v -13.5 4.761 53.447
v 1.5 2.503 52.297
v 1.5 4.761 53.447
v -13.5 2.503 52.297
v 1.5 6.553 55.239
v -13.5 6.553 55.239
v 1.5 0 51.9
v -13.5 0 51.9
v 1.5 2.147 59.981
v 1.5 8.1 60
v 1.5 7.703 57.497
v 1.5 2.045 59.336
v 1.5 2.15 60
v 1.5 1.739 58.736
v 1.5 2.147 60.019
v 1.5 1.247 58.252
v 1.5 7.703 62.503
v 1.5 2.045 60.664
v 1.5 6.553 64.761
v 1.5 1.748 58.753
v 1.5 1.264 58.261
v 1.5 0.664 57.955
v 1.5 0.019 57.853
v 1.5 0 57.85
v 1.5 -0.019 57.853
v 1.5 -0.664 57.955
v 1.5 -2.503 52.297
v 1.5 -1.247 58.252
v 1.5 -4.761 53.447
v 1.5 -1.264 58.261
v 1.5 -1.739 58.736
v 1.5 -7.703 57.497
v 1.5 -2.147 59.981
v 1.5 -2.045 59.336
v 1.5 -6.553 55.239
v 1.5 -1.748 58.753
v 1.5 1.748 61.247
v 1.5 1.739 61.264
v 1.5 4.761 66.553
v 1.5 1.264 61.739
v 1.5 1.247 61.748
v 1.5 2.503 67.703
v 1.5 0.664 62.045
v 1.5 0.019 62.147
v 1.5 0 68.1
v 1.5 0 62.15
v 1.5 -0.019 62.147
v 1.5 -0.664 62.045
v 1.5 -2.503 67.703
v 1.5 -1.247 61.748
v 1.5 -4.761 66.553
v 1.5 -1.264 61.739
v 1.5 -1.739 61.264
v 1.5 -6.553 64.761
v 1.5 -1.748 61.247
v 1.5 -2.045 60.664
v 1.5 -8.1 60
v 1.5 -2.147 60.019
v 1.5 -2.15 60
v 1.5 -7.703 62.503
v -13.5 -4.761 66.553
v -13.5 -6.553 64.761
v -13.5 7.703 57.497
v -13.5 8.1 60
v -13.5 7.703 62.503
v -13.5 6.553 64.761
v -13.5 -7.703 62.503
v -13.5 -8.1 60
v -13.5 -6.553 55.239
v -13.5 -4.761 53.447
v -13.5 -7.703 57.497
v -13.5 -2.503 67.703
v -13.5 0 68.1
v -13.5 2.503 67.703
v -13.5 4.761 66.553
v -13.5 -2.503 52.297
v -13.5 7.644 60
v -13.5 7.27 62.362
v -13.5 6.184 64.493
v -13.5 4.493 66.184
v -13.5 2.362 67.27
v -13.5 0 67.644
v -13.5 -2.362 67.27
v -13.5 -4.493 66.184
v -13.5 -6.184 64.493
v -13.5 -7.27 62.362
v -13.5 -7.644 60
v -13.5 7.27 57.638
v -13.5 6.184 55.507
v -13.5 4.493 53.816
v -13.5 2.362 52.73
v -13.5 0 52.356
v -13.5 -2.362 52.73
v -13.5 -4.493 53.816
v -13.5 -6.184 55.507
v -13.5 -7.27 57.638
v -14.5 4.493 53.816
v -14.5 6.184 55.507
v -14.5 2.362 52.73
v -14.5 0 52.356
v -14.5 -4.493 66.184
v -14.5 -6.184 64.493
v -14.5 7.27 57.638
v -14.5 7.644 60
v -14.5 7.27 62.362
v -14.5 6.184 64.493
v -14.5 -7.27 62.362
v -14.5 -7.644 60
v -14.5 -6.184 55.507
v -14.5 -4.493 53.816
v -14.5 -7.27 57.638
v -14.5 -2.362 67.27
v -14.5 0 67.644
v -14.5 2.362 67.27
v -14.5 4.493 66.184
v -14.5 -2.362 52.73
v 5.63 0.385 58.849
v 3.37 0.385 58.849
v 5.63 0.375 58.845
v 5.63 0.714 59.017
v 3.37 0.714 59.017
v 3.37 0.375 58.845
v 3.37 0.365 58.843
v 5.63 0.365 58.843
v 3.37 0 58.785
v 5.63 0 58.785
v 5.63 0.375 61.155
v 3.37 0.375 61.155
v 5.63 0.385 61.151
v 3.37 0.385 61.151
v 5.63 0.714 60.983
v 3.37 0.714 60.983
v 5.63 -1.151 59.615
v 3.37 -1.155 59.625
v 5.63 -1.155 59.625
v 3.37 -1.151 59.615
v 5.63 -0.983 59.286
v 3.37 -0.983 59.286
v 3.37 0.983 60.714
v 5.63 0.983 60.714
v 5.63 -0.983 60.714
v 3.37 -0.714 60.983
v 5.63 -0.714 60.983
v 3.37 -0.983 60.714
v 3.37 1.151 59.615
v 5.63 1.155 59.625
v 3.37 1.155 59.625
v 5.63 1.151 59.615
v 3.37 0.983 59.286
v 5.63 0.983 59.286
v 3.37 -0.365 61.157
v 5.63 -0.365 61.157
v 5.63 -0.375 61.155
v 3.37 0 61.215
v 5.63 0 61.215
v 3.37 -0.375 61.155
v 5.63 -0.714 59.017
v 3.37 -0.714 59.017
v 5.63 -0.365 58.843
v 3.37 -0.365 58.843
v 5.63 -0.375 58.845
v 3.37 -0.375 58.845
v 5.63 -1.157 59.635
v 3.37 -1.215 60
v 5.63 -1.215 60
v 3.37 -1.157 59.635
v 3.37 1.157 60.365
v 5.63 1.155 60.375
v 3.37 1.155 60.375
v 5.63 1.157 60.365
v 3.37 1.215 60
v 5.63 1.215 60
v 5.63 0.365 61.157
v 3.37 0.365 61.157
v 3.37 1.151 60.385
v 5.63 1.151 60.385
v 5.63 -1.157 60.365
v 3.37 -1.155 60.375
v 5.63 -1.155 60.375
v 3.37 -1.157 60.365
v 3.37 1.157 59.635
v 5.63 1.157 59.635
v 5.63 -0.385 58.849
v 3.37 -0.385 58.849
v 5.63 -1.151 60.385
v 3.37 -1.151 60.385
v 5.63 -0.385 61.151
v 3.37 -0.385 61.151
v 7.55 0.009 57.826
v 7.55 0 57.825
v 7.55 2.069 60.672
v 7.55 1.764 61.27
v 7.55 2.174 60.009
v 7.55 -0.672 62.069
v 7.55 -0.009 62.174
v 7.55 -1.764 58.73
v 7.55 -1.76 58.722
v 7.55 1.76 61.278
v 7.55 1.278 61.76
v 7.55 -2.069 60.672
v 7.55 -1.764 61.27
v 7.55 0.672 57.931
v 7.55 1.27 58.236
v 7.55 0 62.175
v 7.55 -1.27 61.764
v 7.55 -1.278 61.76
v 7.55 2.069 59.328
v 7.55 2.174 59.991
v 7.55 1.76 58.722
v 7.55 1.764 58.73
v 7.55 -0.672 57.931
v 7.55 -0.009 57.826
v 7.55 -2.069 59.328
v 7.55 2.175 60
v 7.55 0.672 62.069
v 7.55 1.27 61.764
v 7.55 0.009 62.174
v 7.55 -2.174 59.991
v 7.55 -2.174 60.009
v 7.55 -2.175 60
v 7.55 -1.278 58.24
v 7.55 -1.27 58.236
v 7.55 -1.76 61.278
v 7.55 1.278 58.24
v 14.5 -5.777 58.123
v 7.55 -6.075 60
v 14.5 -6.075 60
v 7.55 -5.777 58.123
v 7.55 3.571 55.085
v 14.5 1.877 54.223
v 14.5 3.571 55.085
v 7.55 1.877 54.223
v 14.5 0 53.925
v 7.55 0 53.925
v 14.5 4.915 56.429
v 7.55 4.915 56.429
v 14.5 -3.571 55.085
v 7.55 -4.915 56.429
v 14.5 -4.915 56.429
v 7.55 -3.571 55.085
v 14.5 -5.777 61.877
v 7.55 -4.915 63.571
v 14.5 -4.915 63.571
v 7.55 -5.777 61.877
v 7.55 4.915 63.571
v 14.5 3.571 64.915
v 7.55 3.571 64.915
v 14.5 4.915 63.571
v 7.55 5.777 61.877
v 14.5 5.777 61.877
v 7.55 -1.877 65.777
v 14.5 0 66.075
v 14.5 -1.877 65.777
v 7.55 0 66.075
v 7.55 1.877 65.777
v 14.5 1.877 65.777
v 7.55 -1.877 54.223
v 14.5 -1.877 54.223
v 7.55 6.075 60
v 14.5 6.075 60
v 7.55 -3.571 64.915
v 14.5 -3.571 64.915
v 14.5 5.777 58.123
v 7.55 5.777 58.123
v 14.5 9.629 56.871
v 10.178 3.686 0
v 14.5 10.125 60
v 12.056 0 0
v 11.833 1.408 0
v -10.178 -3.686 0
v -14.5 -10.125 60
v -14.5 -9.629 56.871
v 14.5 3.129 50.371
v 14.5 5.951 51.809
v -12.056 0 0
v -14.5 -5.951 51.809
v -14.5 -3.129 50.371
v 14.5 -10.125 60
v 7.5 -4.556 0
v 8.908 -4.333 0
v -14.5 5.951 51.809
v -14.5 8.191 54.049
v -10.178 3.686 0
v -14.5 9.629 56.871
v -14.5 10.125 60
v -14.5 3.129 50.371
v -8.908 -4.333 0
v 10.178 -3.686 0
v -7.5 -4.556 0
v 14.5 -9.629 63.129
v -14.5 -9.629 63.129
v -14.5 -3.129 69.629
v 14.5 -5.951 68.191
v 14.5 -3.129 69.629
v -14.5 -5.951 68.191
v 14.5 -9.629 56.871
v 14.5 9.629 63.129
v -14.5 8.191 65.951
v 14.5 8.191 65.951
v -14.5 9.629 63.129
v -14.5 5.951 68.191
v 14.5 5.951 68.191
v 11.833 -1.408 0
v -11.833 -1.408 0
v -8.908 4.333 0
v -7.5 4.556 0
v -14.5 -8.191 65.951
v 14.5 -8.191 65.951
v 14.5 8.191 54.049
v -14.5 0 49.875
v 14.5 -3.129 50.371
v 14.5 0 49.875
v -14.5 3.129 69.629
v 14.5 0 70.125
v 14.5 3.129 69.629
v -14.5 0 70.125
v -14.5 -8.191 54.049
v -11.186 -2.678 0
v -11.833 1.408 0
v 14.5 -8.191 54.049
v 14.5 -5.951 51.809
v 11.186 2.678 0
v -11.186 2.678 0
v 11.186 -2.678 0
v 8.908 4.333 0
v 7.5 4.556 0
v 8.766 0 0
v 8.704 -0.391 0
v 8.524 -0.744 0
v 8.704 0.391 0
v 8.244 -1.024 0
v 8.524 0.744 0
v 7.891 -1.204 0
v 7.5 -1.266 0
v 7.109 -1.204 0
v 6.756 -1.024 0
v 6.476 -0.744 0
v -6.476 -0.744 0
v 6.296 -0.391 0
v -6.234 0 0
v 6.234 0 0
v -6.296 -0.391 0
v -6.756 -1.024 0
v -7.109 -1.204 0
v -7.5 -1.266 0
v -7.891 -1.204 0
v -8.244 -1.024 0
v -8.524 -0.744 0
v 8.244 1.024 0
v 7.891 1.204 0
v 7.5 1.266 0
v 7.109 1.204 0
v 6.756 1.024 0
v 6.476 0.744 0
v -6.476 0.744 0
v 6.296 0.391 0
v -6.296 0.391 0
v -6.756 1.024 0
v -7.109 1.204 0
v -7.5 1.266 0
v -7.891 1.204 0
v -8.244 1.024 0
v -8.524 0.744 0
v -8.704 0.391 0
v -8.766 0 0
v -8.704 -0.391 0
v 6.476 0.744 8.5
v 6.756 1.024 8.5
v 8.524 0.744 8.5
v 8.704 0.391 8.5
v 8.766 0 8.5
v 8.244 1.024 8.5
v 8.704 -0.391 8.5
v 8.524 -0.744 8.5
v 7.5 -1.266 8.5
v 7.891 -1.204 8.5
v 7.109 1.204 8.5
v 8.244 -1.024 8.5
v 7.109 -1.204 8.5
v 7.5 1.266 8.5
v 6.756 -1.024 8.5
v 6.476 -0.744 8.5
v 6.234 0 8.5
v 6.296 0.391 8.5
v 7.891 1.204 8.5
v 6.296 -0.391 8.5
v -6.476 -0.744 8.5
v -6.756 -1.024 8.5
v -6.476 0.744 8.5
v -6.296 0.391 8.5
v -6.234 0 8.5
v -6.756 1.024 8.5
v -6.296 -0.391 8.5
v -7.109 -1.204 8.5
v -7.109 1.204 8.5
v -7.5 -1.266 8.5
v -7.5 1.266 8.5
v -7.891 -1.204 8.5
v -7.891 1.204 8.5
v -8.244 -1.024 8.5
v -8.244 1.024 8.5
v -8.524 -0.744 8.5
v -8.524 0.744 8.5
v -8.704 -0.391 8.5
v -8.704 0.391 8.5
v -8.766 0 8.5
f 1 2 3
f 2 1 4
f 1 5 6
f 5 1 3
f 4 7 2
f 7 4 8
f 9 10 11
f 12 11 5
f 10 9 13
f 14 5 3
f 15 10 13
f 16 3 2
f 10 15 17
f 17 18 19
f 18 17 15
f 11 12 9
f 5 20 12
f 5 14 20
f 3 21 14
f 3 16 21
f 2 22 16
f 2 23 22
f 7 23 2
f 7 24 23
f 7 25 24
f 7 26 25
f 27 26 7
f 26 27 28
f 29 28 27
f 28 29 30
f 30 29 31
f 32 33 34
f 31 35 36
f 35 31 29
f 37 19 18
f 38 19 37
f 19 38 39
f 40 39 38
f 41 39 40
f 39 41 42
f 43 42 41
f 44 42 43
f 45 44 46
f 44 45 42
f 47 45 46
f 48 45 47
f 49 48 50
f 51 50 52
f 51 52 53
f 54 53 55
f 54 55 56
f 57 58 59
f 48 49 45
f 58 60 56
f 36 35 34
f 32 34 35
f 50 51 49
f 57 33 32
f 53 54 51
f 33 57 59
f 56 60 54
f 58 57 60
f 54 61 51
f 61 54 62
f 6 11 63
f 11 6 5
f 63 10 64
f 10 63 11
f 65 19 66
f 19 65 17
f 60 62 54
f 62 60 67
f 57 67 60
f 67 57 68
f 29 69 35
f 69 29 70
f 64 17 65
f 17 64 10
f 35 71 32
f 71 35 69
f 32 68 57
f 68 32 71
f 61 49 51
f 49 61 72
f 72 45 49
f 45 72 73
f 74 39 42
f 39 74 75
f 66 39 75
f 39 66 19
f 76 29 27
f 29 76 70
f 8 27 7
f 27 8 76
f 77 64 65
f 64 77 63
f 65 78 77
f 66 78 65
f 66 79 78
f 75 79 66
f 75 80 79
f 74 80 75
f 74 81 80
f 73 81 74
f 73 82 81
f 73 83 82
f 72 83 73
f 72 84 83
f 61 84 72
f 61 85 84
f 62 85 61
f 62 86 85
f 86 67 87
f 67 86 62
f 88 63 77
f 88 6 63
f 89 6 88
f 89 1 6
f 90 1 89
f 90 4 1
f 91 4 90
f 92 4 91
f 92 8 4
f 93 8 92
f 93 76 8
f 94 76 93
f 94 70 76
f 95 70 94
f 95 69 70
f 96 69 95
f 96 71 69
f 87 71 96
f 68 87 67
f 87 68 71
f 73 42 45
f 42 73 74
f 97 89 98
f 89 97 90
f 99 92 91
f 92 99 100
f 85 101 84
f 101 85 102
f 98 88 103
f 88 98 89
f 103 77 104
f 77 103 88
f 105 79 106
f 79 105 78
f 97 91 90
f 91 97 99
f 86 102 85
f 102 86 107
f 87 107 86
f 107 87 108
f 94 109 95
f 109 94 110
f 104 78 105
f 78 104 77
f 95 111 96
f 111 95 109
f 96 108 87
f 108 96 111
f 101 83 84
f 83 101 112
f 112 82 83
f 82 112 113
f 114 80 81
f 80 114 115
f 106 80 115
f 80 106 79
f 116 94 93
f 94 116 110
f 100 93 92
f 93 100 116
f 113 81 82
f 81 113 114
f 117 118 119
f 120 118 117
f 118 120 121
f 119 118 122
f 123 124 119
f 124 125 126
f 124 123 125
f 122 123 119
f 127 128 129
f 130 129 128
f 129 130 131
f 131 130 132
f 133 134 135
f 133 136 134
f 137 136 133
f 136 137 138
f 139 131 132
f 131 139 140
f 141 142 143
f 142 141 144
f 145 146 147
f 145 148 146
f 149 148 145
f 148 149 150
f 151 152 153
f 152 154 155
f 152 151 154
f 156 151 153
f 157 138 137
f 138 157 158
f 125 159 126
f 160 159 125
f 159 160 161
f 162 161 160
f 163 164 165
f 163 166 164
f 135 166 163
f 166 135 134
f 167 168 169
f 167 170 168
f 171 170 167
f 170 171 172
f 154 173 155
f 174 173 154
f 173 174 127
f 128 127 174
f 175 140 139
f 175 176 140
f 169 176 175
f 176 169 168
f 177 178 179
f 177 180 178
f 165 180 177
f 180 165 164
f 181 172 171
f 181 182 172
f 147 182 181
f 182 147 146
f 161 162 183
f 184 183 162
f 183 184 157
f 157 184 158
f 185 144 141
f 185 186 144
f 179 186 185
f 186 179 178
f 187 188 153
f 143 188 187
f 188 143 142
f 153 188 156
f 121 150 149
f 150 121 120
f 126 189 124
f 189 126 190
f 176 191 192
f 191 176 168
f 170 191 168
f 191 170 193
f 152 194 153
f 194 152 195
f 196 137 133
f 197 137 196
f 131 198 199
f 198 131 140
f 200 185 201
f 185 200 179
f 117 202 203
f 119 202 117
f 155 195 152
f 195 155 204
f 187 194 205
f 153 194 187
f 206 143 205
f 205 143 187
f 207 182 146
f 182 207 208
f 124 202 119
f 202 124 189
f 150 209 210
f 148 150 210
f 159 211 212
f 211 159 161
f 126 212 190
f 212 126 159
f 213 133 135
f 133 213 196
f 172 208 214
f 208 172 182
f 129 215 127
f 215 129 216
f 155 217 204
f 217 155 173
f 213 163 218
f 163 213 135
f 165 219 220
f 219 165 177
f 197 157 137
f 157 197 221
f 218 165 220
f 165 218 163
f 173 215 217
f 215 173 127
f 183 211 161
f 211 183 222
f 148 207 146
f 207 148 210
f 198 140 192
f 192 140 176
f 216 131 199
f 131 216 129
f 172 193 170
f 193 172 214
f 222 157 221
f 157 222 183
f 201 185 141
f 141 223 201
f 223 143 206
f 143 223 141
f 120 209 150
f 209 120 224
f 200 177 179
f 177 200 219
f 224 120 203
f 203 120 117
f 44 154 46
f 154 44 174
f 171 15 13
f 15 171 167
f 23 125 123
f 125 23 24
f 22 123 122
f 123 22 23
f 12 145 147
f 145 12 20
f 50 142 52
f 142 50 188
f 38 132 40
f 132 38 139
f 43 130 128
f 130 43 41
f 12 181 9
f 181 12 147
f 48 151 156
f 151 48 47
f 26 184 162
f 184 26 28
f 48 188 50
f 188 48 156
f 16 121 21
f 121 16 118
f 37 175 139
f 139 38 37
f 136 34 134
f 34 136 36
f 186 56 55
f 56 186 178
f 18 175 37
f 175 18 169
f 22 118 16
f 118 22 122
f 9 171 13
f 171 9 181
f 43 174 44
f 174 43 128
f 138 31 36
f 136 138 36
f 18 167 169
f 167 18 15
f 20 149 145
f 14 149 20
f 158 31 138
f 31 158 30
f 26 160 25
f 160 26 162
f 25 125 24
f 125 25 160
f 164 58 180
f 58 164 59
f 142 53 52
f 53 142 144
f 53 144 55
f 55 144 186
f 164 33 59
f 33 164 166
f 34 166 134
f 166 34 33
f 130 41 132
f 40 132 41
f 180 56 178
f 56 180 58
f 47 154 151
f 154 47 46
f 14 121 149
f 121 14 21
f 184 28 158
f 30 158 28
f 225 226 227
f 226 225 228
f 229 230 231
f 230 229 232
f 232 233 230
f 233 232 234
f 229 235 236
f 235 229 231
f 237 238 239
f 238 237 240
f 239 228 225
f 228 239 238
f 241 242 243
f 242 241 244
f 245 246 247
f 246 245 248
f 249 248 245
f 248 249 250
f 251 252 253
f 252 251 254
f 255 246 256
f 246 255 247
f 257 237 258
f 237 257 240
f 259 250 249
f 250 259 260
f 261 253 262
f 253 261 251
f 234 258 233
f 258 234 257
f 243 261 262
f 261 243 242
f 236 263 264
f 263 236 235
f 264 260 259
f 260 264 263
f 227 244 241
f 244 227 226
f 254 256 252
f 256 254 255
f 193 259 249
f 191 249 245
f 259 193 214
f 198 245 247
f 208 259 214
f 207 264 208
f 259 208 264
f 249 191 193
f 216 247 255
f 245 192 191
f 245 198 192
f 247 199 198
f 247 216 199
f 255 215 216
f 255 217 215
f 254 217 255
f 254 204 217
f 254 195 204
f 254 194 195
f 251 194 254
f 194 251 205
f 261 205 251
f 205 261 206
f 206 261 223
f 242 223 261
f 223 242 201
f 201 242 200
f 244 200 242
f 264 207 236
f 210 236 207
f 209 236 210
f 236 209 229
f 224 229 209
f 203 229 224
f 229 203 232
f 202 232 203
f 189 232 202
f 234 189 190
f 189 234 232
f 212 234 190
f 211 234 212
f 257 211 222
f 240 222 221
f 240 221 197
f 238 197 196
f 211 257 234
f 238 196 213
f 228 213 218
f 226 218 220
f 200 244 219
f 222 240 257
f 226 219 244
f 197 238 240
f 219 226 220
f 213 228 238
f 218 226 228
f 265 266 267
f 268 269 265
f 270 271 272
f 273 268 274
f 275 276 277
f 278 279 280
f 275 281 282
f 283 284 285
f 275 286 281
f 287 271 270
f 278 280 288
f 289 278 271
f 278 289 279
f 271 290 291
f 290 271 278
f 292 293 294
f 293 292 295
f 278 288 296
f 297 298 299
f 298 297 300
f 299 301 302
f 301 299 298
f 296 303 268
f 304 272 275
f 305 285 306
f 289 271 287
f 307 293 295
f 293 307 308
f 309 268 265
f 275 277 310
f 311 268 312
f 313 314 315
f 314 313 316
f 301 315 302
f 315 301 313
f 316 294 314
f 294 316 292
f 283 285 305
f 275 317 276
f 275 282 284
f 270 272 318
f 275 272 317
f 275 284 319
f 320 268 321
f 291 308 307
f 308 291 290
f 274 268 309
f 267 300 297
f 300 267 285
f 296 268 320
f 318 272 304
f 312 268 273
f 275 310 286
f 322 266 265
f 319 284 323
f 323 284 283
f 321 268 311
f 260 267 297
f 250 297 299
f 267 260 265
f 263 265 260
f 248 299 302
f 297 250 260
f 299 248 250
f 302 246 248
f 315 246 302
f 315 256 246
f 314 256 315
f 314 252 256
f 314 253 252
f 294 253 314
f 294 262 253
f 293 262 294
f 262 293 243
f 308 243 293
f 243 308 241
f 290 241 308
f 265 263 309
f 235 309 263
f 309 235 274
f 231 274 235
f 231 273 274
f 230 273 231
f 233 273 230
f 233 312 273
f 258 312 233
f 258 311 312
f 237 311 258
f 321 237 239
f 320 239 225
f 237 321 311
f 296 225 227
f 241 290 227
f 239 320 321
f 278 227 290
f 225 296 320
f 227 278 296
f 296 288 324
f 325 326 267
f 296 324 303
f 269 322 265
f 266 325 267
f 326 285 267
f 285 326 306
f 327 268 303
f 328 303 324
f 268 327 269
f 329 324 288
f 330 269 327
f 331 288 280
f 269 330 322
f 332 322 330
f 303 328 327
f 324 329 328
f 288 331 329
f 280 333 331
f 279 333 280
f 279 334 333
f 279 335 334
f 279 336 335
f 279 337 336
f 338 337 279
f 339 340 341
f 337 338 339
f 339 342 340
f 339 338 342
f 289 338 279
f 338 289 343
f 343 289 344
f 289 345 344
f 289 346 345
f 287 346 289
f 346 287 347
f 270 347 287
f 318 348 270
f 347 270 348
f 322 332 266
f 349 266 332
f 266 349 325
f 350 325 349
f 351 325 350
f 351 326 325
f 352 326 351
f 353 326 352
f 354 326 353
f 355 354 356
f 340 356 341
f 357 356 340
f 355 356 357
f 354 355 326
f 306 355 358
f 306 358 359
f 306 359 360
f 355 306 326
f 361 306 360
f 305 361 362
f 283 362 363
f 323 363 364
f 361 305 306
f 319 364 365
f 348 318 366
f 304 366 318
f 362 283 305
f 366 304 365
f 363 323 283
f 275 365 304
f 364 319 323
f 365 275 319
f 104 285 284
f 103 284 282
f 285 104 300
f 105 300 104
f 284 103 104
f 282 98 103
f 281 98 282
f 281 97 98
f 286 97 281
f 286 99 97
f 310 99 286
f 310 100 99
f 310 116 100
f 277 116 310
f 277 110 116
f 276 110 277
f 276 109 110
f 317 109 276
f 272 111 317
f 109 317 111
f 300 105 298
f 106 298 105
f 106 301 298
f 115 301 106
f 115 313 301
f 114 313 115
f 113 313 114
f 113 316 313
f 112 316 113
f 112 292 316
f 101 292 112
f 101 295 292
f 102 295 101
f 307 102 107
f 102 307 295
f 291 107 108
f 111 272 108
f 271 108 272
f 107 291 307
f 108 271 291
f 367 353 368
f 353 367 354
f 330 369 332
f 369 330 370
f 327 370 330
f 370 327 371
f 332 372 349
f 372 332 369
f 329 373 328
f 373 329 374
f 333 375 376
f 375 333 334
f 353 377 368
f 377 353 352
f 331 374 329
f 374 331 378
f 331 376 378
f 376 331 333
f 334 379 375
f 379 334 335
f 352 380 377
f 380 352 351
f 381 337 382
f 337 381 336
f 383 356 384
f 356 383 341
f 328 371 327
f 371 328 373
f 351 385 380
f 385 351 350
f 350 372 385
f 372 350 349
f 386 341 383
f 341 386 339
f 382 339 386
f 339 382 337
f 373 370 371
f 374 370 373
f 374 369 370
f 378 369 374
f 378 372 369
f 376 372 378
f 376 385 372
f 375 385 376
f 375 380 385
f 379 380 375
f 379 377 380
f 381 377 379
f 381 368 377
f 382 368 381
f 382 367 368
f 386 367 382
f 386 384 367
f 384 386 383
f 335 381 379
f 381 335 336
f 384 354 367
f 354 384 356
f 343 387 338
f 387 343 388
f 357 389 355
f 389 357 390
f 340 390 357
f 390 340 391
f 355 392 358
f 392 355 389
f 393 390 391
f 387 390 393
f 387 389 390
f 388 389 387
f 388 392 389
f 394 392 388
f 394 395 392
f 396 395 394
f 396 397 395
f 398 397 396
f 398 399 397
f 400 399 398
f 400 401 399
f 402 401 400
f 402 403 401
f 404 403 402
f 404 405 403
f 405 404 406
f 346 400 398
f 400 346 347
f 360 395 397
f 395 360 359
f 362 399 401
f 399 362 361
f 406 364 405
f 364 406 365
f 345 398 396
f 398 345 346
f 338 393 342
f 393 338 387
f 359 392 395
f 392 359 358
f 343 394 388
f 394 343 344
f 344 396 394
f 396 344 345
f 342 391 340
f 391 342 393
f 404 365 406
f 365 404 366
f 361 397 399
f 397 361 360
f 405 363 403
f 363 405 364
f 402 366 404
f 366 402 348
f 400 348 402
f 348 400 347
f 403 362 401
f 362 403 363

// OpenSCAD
// Customizable Filament Pickup for the E3D Tool Changer
// Copyright: Olle Wreede 2020
// License: CC BY-SA

//CUSTOMIZER VARIABLES

// TODO: Add bowden coupling to simple filament hole version
// TODO: Use teardrop holes

/* [Base values] */

// Height in mm of pickup
height_of_pickup = 60; // [30:5:100]

// Width in mm of pickup base
width_of_pickup = 15; // [15:30]

// Depth in mm of pickup base
depth_of_pickup = 9; // [5:0.5:15]

// Type of filament pickup
filament_filter = 20; // [0:Simple filament hole, 15:15mm filament filter, 20:20mm filament filter]

/* [Filament filter] */

// Length in mm of filament filter
filament_filter_length = 15; // [10:1:20]

// Thickness in mm of filament filter cylinder wall
filament_filter_thickness = 2; // [2:0.1:6]

// Width in mm of lip of the filament filter hole
filament_filter_lip = 1; // [0.0:0.1:3.0]

/* [Simple bowden hole] */

// Width in mm of pickup top (not used for filter)
width_top = 15; // [10:20]

// Depth in mm of pickup top (not used for filter)
depth_top = 9; // [5:0.5:15]

// Diameter in mm of filament hole (not used for filter)
filament_hole_diameter = 2.4; // [1.8:0.1:4]

// Diameter in mm of bowden tube hole (not used for filter)
bowden_hole_diameter = 4.2; // [4:0.1:8]

/* [Mount holes] */

// Diameter in mm of mount screw holes
mount_hole_diameter = 2.5; // [0:None, 2.5:M2.5, 3:M3, 4:M4, 5:M5, 6:M6]

// Distance in mm of mount holes from edge
mount_hole_distance = 15; // [10:0.5:20]

// Depth in mm of mount holes
mount_hole_depth = 8.5; // [5:0.5:10]

//CUSTOMIZER VARIABLES END

/* [Hidden] */

$fn=20;
fudge = 0.1;
bowden_coupling_hole_diameter = 12;
bowden_coupling_hole_depth = 7;
filter_bottom_thickness = 12;

/* Helper modules */

module cylinder_outer(diameter, height, fn) {
   fudge = 1 / cos(180 / fn);
   cylinder(h=height, r=diameter / 2 * fudge, $fn=fn, center=true);
}

module cube_rounded(width, height, thickness, radius=1) {
	minkowski() {
		cube([width - 2 * radius, height - 2 * radius, thickness/2], center = true);
		cylinder(r = radius, h = thickness/2, center = true);
	}
}

/* Mount */

module mount_holes(hole_diameter, hole_distance, hole_depth) {
    translate([hole_distance / 2, 0, 0])
    cylinder_outer(hole_diameter, hole_depth, $fn);
    
    translate([-hole_distance / 2, 0, 0])
    cylinder_outer(hole_diameter, hole_depth, $fn);
}

module filament_pickup_base(width, depth) {
    base_height = 1;
    
    translate([0, 0, base_height/2])
    difference() {
        union() {
            translate([-width/2, 0, 0])
            cylinder_outer(depth, base_height, $fn);

            cube([width, depth, base_height], center=true);

            translate([width/2, 0, 0])
            cylinder_outer(depth, base_height, $fn);
        }
    }
}

module filament_pickup_top(width, depth, height, filament_hole_diameter, bowden_hole_diameter) {
    translate([0, 0, height])
    rotate([0, 90, 0])
    cylinder_outer(depth, width, $fn);
}

module filament_filter_cylinder(height, filter_size, filter_length, filter_thickness, bottom_thickness) {
    translate([0, 0, height])
    rotate([0, 90, 0])
    cylinder_outer(
        filter_size,
        filter_length + bottom_thickness + filter_thickness,  
        $fn);
}

module filament_filter_hole(height, filter_size, filter_length, filter_thickness, bottom_thickness, filter_lip) {
    translate([-bottom_thickness / 2, 0, height])
    rotate([0, 90, 0])
    cylinder_outer(
        filter_size - filter_thickness * 2,
        filter_length,
        $fn);
    translate([-bottom_thickness / 2 - filter_thickness / 2 - fudge, 0, height])
    rotate([0, 90, 0])
    cylinder_outer(
        filter_size - filter_thickness * 2 - filter_lip + fudge,
        filter_length,
        $fn);        
}

module filament_pickup_filter(width, height, depth, 
    filament_hole_diameter, bowden_hole_diameter, 
    mount_hole_diameter, mount_hole_distance,
    filter_size, filter_length, filter_thickness,
    filter_lip) {

    difference() {
        hull() {
            filament_pickup_base(width, depth);
            filament_filter_cylinder(
                height,
                filter_size,
                filter_length,
                filter_thickness,
                filter_bottom_thickness);
        }
        
        filament_filter_hole(
            height,
            filter_size,
            filter_length,
            filter_thickness,
            filter_bottom_thickness,
            filter_lip);
    
        // Filament hole
        translate([0, 0, height])
        rotate([0, 90, 0]) {
            filter_width = filter_length + filter_bottom_thickness + filter_thickness;
            filament_hole_length = filter_bottom_thickness - bowden_coupling_hole_depth;
//            translate([0, 0, (filter_bottom_thickness - bowden_coupling_hole_depth) / 2])
            translate([0, 0, filter_width / 2 - bowden_coupling_hole_depth - filament_hole_length / 2 - 0.5])
            {
                cylinder_outer(
                    filament_hole_diameter,
                    filament_hole_length + 2,   
                    $fn);
                
                // Outer filament hole fillet
                translate([0, 0, filament_hole_length / 2 - 0.5 + fudge])
                #cylinder(h=2, d1=filament_hole_diameter, d2=filament_hole_diameter + 2, center=true);

                // Inner filament hole fillet
                translate([0, 0, -filament_hole_length / 2 - filter_thickness / 2 + 1.5 - fudge])
                #cylinder(h=2, d1=filament_hole_diameter + 2, d2=filament_hole_diameter, center=true);
            }
            
            // Bowden coupling hole
            translate([0, 0, filter_width / 2 - bowden_coupling_hole_depth / 2 + fudge])
            cylinder_outer(
                bowden_coupling_hole_diameter,
                bowden_coupling_hole_depth + fudge,
                $fn);
        }
    }
}

module filament_pickup_simple(width, height, depth, 
    filament_hole_diameter, bowden_hole_diameter, 
    mount_hole_diameter, mount_hole_distance, 
    width_top, depth_top) {

    difference() {
        hull() {
            filament_pickup_base(width, depth);
            filament_pickup_top(width_top, depth_top, height, filament_hole_diameter, bowden_hole_diameter);
        }
    
        // Filament hole
        translate([0, 0, height])
        rotate([0, 90, 0]) {
            translate([0, 0, -width/2])
            cylinder_outer(filament_hole_diameter, width, $fn);
            
            // Inner filament hole fillet
            cylinder(h=1, d1=filament_hole_diameter, d2=filament_hole_diameter + 1, center=true);
            
            // Outer filament hole fillet
            translate([0, 0, -width_top/2 - 0.35])
            #cylinder(h=2, d1=filament_hole_diameter + 1, d2=filament_hole_diameter, center=true);

            // Bowden hole
            translate([0, 0, width/2])
            cylinder_outer(bowden_hole_diameter, width, $fn);

            // Outer bowden hole fillet
            translate([0, 0, width_top/2 + 0.35])
            #cylinder(h=2, d1=bowden_hole_diameter, d2=bowden_hole_diameter + 1, center=true);
        }
    }
}

module filament_pickup(width, height, depth, 
    filament_hole_diameter, bowden_hole_diameter, 
    mount_hole_diameter, mount_hole_distance, mount_hole_depth,
    width_top, depth_top, filter_size, filter_length,
    filter_thickness, filter_lip) {
    difference() {
        if (filter_size == 0) {
            filament_pickup_simple(
                width,
                height,
                depth, 
                filament_hole_diameter,
                bowden_hole_diameter,
                mount_hole_diameter,
                mount_hole_distance,
                width_top,
                depth_top);
        } else {
            filament_pickup_filter(
                width,
                height,
                depth, 
                filament_hole_diameter,
                bowden_hole_diameter, 
                mount_hole_diameter,
                mount_hole_distance,
                filter_size,
                filter_length,
                filter_thickness,
                filter_lip);
        }

        // Mount holes
        translate([0, 0, mount_hole_depth / 2])
        #mount_holes(mount_hole_diameter, mount_hole_distance, mount_hole_depth);
    }
}

filament_pickup(
    width_of_pickup,
    height_of_pickup,
    depth_of_pickup,
    filament_hole_diameter,
    bowden_hole_diameter,
    mount_hole_diameter,
    mount_hole_distance,
    mount_hole_depth,
    width_top,
    depth_top,
    filament_filter,
    filament_filter_length,
    filament_filter_thickness,
    filament_filter_lip);
